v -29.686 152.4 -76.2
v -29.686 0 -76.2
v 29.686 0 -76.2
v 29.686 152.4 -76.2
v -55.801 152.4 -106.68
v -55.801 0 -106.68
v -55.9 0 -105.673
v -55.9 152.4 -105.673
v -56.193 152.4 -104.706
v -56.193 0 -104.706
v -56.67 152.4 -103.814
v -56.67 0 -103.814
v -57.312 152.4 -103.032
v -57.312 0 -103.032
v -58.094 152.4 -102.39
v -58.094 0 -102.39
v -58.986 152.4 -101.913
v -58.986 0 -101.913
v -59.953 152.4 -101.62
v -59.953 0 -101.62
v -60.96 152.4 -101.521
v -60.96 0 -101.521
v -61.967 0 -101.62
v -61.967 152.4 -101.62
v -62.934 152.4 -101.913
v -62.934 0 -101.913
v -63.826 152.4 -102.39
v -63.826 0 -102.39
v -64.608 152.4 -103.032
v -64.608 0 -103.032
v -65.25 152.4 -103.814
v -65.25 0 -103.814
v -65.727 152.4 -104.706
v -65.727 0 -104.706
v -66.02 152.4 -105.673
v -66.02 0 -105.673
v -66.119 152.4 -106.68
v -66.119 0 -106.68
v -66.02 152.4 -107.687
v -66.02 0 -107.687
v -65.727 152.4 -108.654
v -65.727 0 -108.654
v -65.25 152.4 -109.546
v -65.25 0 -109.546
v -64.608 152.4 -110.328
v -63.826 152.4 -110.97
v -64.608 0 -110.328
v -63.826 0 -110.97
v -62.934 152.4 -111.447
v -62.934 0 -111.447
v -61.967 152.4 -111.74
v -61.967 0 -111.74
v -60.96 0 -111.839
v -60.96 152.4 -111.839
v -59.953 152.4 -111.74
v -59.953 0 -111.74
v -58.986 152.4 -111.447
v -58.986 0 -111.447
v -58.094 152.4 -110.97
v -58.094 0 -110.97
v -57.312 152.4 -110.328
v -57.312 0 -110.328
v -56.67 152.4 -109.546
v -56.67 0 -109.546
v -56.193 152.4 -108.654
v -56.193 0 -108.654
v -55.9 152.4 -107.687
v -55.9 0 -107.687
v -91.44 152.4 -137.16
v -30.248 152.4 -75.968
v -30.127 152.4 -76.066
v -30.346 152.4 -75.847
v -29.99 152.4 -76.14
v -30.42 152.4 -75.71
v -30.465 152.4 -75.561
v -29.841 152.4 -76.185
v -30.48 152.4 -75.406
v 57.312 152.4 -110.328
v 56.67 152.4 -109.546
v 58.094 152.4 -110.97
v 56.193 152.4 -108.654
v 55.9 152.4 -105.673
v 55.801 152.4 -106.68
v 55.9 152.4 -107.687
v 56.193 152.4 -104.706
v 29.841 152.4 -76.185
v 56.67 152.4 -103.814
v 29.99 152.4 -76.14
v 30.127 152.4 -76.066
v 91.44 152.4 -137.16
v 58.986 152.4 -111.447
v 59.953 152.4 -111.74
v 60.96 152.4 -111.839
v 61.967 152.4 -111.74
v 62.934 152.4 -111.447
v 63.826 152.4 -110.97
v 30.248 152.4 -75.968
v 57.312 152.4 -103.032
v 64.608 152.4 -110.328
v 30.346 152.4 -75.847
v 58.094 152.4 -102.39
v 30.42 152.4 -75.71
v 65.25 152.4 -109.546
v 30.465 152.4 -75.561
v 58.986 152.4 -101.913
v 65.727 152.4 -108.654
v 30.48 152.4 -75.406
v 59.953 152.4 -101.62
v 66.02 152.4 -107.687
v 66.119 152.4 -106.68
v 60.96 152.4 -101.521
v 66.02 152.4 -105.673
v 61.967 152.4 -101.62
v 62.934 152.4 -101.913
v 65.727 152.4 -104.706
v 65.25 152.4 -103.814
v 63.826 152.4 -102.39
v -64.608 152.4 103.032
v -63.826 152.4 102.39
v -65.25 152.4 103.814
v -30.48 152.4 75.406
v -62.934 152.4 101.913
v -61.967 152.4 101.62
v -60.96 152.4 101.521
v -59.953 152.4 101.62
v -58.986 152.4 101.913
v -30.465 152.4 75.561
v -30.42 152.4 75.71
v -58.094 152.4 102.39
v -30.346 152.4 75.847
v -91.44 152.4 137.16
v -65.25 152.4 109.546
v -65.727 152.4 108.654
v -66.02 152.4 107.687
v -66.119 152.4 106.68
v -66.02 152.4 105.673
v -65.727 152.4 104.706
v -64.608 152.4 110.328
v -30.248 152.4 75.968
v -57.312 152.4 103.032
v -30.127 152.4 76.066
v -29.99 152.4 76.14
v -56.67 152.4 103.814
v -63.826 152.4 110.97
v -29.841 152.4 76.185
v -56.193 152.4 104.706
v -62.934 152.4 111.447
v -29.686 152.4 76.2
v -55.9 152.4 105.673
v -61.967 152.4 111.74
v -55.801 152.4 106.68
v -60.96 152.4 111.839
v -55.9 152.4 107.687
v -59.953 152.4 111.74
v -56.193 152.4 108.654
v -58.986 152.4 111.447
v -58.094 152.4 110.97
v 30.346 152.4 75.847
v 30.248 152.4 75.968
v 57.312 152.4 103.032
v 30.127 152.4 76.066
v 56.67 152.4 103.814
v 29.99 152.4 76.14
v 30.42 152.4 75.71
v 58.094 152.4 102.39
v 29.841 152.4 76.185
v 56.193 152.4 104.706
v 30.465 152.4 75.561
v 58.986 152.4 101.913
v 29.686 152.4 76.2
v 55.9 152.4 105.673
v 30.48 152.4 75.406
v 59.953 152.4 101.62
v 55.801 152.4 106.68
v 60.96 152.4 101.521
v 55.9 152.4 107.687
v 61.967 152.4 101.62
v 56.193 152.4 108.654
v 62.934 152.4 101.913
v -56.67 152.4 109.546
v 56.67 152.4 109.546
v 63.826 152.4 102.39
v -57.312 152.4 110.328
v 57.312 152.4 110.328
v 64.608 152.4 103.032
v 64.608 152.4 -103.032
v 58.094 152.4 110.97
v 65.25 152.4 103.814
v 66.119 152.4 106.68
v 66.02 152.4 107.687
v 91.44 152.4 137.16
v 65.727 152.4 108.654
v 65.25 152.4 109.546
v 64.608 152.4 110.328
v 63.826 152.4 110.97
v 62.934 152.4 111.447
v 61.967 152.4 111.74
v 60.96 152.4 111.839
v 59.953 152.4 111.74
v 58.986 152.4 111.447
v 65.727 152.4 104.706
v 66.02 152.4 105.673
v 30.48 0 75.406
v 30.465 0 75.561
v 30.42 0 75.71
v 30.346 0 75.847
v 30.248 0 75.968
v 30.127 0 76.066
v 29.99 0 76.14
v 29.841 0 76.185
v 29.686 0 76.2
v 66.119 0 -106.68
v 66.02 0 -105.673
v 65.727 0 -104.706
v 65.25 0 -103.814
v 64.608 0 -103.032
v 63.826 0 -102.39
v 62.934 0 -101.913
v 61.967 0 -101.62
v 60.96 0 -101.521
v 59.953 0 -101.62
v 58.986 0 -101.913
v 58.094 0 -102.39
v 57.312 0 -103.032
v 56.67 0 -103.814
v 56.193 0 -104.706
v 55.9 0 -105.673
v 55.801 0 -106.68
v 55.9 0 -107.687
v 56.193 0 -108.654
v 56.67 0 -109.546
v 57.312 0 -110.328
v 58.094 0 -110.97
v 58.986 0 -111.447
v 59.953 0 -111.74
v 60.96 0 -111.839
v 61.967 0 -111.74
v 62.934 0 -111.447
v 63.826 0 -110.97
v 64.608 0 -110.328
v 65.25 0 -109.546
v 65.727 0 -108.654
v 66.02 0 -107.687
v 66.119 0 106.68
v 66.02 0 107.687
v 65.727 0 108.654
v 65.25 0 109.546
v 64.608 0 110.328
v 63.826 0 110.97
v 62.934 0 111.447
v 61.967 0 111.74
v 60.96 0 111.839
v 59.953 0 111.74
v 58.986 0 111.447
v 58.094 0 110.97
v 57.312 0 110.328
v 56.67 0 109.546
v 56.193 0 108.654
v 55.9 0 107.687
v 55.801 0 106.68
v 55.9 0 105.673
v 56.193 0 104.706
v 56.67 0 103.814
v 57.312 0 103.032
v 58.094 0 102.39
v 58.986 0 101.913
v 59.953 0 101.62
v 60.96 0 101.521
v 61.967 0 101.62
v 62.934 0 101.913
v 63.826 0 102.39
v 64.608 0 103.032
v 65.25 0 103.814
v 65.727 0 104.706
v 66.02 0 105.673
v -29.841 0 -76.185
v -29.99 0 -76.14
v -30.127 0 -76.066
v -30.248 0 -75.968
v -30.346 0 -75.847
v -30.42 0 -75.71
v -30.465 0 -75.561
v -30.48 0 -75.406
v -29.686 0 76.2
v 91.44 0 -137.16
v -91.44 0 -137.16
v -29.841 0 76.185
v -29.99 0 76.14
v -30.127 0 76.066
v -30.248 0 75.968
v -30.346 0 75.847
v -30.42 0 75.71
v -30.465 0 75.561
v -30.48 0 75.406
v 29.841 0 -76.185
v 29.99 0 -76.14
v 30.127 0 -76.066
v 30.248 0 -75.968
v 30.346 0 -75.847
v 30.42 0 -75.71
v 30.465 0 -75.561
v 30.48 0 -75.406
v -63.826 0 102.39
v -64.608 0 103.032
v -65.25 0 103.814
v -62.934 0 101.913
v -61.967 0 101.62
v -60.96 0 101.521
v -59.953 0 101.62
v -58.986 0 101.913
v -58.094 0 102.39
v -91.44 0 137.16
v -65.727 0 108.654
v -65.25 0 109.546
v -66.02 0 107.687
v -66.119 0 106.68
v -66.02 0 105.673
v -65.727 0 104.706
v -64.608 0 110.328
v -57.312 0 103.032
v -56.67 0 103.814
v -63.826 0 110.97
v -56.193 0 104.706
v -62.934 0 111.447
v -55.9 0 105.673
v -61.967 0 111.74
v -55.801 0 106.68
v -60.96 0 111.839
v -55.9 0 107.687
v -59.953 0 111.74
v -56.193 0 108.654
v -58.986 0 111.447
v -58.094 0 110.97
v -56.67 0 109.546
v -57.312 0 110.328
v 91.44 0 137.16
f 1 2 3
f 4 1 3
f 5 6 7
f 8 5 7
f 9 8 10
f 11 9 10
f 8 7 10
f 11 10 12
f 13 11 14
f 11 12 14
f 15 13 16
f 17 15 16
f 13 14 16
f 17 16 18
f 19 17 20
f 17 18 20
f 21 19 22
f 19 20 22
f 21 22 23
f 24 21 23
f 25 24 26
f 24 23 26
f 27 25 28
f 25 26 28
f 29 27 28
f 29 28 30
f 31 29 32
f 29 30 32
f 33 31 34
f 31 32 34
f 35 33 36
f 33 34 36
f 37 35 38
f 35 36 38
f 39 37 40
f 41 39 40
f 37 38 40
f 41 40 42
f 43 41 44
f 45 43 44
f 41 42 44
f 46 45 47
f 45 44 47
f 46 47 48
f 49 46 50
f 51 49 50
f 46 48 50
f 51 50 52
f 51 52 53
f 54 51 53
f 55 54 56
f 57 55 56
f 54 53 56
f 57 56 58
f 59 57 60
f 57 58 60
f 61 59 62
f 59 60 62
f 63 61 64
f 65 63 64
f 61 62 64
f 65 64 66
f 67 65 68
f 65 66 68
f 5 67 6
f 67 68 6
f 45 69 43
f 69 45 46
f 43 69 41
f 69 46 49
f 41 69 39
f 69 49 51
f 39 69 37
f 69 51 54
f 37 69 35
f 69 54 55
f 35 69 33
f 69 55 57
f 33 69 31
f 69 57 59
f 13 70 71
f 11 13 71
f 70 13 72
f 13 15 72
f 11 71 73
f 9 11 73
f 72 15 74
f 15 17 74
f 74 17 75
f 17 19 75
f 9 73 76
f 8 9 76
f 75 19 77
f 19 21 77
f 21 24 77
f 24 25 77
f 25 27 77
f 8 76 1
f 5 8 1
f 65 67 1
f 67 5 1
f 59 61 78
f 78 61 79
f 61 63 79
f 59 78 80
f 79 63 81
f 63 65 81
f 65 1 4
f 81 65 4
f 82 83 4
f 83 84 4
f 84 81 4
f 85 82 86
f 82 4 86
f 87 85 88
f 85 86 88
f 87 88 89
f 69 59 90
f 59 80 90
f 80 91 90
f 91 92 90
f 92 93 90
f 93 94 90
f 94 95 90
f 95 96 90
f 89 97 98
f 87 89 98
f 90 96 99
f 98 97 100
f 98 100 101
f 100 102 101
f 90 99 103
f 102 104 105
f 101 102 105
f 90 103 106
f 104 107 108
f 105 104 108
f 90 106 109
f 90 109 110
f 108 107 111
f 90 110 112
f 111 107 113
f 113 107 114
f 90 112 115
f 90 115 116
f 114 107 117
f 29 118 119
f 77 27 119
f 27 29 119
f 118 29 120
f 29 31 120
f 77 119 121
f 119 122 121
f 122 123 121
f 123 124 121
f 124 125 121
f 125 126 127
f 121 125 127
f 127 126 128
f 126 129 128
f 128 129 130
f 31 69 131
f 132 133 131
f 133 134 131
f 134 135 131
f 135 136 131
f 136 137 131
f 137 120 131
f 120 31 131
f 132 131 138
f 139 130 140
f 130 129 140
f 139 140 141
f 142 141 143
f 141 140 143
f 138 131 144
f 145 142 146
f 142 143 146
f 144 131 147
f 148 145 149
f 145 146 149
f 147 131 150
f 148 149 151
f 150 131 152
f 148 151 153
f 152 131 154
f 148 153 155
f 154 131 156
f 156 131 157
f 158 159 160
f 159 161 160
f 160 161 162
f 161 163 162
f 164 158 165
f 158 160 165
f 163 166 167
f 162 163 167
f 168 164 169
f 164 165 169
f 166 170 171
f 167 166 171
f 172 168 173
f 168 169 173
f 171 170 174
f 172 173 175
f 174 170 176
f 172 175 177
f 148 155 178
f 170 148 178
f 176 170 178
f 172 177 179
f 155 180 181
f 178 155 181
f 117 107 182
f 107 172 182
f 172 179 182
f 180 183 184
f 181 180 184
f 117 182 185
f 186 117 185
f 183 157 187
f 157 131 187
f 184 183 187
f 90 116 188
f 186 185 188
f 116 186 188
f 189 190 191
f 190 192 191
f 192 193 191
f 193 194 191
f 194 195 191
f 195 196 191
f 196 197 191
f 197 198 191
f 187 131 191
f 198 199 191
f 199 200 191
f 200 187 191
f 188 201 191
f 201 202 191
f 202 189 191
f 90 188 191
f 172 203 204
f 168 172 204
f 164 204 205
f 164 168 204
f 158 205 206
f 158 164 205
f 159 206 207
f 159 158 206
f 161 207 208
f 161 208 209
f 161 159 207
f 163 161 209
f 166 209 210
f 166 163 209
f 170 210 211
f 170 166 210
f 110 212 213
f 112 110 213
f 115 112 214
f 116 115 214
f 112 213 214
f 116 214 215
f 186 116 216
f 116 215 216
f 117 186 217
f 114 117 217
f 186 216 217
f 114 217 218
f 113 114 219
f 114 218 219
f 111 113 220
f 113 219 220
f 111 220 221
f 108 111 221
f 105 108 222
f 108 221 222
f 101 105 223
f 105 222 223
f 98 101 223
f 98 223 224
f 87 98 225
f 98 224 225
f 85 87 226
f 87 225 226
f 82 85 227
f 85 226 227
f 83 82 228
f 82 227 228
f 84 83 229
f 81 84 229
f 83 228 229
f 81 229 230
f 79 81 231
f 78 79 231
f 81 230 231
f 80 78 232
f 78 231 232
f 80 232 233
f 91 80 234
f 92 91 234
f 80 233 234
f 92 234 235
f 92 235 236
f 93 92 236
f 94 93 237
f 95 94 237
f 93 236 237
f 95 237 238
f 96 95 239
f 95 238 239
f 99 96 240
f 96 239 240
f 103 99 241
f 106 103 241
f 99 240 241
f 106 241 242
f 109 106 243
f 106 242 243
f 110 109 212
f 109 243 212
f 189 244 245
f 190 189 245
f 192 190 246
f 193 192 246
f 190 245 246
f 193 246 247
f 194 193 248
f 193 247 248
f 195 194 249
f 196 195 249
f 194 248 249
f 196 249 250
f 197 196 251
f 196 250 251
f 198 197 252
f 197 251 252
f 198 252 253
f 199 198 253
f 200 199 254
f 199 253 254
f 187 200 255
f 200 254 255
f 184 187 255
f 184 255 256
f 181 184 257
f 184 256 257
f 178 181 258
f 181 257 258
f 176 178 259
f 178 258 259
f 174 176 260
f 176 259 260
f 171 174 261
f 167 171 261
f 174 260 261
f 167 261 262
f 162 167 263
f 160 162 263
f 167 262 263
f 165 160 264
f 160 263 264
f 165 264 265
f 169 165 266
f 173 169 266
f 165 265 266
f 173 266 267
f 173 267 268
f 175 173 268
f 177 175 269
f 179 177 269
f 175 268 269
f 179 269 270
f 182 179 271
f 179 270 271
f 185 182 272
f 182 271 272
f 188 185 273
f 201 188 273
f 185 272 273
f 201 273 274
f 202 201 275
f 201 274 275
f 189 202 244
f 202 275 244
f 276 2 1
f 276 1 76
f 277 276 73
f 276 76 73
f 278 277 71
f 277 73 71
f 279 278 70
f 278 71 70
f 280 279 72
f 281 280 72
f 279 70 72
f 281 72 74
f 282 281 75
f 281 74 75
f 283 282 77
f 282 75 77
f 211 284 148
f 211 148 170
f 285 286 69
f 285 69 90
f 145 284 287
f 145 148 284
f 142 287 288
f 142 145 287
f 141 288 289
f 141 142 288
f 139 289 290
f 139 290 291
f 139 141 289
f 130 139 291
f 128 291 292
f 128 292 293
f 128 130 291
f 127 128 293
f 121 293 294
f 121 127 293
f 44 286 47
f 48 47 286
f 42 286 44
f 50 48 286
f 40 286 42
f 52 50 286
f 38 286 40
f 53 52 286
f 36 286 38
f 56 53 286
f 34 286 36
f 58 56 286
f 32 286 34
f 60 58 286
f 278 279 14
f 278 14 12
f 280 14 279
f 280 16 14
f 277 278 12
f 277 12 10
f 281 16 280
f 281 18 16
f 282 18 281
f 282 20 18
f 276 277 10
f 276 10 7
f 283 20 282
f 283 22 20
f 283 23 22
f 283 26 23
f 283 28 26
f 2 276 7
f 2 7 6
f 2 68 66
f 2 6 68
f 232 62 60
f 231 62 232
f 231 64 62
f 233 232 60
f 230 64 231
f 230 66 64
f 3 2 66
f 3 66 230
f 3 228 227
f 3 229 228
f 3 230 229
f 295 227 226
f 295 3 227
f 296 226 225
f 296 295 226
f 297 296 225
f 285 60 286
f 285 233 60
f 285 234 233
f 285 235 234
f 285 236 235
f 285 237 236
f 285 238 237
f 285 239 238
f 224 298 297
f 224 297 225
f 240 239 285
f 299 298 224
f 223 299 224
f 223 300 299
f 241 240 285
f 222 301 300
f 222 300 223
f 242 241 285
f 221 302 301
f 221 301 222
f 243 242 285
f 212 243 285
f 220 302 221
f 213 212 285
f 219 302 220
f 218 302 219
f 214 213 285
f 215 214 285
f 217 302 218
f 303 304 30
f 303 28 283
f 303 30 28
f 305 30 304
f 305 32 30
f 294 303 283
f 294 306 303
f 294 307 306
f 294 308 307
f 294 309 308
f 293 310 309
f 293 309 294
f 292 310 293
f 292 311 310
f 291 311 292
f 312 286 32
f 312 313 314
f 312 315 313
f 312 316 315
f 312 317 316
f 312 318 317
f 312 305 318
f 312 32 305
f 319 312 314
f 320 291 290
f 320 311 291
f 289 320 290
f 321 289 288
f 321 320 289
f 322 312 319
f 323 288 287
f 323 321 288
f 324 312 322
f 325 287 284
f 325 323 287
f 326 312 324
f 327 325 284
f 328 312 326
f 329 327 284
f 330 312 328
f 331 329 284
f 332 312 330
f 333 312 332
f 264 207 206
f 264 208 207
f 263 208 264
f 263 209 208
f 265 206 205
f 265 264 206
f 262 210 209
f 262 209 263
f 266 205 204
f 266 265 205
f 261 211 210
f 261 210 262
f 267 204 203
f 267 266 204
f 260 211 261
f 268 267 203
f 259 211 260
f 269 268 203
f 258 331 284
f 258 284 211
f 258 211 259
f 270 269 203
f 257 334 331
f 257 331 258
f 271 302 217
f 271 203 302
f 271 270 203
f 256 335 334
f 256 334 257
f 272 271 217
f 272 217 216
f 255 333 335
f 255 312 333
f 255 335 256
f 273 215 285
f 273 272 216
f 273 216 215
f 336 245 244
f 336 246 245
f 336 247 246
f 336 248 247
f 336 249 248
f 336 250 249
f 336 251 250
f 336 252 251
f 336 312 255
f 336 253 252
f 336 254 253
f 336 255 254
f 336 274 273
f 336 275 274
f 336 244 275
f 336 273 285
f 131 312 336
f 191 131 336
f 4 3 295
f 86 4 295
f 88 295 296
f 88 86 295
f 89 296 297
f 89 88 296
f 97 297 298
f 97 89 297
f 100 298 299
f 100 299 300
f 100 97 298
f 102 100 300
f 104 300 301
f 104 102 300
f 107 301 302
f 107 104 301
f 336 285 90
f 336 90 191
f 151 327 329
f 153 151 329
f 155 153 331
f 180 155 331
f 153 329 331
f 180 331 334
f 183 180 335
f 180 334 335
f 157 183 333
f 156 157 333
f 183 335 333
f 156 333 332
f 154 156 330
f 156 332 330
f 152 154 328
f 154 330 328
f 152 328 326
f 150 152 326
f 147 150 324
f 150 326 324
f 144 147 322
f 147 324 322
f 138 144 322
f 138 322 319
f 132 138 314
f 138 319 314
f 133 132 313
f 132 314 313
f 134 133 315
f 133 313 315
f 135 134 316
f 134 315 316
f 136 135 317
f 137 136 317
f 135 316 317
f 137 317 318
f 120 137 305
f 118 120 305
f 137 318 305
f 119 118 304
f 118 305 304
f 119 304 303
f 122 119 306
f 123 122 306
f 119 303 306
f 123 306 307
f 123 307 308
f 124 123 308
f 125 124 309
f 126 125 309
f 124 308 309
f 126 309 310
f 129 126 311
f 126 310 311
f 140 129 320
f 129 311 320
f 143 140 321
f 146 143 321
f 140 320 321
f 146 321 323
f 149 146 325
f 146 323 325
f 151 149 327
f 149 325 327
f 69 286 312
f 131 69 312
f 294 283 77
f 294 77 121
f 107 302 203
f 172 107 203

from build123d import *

# Parameters (mm, degrees)
F2_W     = 182.88
F2_H     = 274.32
F3_DEPTH = 152.4
F4_R     = 5.159375
F5_DEPTH = 152.4
F6_W     = 60.96
F6_H     = 152.4
F7_DEPTH = 152.4
F8_R     = 0.79375


with BuildPart() as f3:
    # F2 (on Front) → F3 (new body)
    with BuildSketch(Plane.XZ):
        Rectangle(F2_W, F2_H)
    extrude(amount=-F3_DEPTH)

    # F4 (on face) → F5 (cut)
    with BuildSketch(Plane.XZ):
        with Locations((-60.96, 106.68)):
            Circle(F4_R)
        with Locations((60.96, 106.68)):
            Circle(F4_R)
        with Locations((-60.96, -106.68)):
            Circle(F4_R)
        with Locations((60.96, -106.68)):
            Circle(F4_R)
    extrude(amount=-F5_DEPTH, mode=Mode.SUBTRACT)

    # F6 (on face) → F7 (cut)
    with BuildSketch(Plane.XZ):
        Rectangle(F6_W, F6_H)
    extrude(amount=-F7_DEPTH, mode=Mode.SUBTRACT)

    # F8
    f8_edges = [f3.edges().sort_by_distance(p)[0] for p in [
        (-30.48, 76.2, 76.2),
        (30.48, 76.2, 76.2),
        (30.48, 76.2, -76.2),
        (-30.48, 76.2, -76.2),
    ]]
    fillet(f8_edges, radius=F8_R)


solid = f3.part
